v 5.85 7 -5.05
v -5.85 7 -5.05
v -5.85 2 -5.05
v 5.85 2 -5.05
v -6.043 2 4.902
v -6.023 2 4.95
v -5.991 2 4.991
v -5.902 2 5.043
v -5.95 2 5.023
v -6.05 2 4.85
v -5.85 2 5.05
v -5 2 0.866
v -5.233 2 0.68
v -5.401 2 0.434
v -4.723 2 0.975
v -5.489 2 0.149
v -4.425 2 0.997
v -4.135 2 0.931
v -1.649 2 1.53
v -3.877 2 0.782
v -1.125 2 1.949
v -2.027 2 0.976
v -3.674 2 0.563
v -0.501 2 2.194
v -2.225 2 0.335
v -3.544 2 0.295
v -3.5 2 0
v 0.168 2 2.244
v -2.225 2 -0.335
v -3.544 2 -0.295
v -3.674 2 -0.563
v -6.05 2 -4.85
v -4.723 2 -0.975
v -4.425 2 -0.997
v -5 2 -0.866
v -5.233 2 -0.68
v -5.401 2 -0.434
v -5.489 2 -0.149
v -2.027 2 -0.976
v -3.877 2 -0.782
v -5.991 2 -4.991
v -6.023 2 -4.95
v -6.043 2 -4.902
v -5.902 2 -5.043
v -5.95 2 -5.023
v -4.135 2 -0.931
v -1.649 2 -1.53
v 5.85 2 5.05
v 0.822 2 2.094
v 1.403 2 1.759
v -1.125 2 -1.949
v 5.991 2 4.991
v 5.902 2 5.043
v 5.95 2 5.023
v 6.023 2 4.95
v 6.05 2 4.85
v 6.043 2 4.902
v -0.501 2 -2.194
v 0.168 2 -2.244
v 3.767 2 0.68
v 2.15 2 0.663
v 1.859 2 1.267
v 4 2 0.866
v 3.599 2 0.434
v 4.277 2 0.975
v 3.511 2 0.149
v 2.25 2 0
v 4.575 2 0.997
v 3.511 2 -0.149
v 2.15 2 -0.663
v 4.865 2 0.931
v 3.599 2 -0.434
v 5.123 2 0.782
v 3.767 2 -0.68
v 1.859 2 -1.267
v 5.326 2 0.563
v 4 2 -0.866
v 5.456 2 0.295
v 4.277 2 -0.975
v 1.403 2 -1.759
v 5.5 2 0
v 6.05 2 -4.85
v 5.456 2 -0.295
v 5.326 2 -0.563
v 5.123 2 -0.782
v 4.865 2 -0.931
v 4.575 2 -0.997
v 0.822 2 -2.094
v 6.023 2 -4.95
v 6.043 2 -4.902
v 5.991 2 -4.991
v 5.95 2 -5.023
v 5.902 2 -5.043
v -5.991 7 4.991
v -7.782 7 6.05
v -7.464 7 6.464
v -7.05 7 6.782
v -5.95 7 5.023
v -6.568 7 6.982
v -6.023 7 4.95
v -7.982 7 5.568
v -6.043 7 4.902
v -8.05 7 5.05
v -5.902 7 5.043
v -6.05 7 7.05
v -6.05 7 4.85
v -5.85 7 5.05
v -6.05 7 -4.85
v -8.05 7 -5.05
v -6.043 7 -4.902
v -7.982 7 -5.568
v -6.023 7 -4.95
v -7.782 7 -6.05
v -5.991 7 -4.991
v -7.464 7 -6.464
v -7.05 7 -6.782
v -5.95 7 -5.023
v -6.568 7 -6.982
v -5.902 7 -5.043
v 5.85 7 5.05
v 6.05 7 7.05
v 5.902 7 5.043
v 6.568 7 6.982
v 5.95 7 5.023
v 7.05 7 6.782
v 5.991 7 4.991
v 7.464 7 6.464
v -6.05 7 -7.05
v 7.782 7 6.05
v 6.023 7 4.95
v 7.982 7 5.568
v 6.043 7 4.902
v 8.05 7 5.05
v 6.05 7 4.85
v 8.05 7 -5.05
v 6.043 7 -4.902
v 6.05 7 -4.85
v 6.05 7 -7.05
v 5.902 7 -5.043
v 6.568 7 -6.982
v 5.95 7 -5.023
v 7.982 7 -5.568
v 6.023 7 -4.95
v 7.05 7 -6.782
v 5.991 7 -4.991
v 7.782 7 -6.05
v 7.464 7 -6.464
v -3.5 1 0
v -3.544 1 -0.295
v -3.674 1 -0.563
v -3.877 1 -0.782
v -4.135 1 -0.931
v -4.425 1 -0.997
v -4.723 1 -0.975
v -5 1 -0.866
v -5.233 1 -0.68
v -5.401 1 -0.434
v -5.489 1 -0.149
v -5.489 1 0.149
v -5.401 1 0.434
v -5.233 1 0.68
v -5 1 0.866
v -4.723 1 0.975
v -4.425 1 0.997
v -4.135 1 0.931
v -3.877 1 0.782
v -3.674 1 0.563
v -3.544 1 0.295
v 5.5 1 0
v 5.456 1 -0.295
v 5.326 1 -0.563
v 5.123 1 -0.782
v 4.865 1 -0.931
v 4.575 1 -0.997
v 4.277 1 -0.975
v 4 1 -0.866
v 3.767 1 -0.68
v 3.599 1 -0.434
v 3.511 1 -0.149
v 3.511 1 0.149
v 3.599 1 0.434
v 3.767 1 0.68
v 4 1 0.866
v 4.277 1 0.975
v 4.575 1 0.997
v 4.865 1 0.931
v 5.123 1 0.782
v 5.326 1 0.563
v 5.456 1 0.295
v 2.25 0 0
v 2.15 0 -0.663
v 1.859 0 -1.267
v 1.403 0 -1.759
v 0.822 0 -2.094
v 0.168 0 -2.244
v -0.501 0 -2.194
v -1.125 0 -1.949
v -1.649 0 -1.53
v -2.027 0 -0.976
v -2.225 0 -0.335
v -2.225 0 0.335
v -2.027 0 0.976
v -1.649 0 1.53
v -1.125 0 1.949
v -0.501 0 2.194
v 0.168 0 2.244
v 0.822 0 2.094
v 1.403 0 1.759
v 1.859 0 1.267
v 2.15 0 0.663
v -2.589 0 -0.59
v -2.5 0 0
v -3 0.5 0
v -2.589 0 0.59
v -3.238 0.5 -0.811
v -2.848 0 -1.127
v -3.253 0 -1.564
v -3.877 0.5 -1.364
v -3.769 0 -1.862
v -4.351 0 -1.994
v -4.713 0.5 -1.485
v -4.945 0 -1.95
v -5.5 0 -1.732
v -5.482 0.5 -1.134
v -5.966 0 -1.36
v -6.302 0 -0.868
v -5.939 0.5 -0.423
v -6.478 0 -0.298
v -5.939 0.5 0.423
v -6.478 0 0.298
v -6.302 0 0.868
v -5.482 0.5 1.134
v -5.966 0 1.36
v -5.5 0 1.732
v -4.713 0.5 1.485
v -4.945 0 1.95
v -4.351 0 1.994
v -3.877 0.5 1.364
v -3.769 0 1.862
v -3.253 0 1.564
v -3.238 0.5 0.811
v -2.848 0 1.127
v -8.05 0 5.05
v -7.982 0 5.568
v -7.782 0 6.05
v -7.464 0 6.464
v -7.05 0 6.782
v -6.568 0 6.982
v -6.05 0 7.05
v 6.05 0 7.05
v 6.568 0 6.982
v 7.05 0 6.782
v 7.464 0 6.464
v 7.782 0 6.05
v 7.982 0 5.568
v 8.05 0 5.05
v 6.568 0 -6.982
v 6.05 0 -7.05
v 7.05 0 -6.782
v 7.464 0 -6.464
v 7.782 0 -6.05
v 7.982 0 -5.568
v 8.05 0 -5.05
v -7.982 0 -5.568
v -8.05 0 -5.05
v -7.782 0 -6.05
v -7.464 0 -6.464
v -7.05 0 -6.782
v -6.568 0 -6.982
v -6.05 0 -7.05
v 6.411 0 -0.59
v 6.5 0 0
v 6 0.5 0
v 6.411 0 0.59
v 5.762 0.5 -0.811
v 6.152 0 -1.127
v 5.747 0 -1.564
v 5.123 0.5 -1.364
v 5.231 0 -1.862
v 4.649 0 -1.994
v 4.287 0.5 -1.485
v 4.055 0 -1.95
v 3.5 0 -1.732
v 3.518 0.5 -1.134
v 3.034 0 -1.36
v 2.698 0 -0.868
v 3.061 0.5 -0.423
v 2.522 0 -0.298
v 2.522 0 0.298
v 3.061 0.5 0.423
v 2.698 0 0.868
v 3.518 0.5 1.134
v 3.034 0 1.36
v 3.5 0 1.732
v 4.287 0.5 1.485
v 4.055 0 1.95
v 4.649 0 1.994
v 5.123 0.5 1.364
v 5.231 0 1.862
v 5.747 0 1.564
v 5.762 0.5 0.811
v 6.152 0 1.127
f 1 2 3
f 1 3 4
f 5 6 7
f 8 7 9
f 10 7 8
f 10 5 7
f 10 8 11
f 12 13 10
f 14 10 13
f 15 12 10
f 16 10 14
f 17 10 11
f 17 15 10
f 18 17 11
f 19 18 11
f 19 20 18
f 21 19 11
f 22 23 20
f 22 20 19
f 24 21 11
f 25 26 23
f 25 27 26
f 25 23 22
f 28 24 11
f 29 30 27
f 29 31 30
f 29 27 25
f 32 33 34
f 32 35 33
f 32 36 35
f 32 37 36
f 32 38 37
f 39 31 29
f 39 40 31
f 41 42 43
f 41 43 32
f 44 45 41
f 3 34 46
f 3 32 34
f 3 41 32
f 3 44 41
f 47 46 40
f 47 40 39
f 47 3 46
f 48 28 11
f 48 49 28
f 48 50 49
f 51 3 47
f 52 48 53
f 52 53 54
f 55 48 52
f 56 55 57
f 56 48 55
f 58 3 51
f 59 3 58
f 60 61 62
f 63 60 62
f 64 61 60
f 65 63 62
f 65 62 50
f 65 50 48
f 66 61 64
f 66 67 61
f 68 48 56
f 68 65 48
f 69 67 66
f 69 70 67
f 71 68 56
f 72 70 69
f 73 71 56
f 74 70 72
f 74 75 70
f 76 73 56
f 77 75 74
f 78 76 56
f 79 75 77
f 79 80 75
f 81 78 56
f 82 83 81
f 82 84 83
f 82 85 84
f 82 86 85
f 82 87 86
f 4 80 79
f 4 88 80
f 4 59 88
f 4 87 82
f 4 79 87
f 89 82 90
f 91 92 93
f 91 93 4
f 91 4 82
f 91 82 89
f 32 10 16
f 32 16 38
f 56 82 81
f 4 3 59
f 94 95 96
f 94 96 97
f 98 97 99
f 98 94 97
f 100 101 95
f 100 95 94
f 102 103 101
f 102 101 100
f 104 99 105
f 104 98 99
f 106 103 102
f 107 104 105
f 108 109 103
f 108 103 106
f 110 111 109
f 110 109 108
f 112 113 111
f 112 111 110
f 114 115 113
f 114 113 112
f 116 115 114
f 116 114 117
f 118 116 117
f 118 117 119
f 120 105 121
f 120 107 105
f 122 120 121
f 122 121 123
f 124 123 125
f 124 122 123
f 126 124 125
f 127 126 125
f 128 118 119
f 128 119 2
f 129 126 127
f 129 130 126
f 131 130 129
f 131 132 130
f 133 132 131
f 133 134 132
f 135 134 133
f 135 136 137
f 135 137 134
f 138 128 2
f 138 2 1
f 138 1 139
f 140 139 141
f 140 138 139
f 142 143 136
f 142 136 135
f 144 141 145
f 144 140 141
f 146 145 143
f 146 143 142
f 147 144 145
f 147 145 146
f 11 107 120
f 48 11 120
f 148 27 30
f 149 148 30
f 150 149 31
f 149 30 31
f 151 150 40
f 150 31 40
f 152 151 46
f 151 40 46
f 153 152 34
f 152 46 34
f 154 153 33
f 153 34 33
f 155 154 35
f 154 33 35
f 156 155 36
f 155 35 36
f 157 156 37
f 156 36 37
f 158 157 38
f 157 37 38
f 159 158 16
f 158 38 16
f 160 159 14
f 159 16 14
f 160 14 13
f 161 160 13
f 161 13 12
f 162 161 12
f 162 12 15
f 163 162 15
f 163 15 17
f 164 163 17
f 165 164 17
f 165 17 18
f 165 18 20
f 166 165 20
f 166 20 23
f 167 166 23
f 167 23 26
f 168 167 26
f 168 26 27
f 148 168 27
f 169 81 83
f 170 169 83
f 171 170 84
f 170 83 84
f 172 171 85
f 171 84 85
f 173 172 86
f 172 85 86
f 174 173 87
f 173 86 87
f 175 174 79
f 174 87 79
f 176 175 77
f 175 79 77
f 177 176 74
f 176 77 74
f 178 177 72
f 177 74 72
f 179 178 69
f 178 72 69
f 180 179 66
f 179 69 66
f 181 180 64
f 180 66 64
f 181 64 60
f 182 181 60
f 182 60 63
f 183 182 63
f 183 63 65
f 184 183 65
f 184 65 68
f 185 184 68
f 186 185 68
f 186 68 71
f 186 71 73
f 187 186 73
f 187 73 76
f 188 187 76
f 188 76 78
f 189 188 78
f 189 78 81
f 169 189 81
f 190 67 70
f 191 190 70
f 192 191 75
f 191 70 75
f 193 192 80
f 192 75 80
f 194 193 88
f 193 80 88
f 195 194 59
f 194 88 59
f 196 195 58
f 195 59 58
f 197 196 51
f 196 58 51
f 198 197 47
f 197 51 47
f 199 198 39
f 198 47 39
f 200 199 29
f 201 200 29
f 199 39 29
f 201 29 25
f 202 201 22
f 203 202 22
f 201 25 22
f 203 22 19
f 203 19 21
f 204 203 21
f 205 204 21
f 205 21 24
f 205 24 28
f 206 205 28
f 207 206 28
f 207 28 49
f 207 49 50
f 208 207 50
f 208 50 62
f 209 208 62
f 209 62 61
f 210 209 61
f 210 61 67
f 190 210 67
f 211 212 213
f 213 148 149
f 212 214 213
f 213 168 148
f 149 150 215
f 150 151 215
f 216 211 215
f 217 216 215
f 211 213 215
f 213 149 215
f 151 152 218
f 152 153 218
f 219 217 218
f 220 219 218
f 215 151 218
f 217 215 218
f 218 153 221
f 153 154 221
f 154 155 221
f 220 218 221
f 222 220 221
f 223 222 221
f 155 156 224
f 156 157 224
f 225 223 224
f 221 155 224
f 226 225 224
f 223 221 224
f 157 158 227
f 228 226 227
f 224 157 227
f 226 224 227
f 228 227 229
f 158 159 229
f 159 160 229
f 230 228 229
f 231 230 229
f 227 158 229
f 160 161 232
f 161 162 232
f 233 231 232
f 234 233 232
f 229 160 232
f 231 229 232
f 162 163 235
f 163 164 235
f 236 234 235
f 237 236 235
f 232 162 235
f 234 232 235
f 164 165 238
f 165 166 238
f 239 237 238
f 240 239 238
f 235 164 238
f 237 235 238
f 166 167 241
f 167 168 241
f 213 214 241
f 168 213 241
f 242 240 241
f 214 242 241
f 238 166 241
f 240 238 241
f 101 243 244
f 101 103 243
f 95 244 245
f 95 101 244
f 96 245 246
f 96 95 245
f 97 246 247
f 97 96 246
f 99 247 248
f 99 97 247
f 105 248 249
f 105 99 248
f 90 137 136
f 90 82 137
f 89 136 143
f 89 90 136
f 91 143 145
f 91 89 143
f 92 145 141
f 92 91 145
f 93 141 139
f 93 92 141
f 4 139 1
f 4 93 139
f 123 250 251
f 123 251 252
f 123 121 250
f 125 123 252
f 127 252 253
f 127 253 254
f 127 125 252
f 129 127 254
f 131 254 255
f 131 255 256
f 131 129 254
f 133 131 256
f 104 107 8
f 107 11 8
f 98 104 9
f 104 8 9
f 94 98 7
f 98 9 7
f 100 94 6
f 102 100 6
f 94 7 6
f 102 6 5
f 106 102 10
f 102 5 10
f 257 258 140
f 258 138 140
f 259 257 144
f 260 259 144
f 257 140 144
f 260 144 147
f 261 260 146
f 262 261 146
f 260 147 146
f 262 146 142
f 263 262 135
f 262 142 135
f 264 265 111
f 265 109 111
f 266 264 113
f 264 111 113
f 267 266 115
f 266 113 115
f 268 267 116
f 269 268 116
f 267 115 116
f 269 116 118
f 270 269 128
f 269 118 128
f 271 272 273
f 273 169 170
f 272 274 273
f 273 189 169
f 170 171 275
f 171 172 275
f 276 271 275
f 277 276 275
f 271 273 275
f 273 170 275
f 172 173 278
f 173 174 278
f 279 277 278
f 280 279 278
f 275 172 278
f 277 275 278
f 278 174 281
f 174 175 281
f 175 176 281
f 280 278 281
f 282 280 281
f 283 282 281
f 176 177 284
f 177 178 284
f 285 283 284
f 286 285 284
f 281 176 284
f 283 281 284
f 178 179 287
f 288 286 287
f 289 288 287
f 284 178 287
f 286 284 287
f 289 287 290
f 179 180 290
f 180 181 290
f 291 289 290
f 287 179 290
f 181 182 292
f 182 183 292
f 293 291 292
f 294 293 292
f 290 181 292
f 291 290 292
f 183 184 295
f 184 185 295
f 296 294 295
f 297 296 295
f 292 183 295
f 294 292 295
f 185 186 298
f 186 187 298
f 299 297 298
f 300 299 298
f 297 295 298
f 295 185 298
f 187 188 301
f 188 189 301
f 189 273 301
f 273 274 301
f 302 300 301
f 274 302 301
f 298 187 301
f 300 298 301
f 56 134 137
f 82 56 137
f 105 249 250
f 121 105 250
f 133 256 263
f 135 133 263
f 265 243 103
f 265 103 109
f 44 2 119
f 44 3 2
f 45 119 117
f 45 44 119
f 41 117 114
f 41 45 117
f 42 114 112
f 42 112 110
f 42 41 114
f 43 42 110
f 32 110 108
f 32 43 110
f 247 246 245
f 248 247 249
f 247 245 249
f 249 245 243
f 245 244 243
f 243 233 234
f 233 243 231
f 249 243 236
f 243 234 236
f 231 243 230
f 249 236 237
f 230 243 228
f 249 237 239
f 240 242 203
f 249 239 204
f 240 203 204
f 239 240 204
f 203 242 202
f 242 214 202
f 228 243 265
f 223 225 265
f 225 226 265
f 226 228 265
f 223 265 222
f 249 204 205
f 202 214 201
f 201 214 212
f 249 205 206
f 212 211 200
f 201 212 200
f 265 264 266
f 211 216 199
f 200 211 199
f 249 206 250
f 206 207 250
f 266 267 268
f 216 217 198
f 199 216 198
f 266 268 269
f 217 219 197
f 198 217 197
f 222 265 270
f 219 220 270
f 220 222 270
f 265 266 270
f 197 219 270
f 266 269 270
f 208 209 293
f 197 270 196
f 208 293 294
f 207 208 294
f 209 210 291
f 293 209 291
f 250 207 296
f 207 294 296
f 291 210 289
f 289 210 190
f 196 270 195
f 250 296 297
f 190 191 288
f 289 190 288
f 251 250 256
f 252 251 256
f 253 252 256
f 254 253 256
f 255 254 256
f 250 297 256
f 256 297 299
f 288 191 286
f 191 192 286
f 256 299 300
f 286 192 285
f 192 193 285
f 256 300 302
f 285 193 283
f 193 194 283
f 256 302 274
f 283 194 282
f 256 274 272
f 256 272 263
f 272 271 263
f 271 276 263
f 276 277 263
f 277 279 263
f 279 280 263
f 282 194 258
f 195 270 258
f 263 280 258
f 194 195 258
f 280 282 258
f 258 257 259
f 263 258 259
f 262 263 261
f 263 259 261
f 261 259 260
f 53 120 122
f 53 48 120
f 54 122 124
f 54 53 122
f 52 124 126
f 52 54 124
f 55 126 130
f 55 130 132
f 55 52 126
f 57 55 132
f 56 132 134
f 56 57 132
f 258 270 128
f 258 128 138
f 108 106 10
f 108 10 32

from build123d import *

# Parameters (mm, degrees)
SKETCH1_W                                            = 16.1
SKETCH1_H                                            = 14.1
BOSS_EXTRUDE1_DEPTH                                  = 7
SKETCH3_W                                            = 12.1
SKETCH3_H                                            = 10.1
CUT_EXTRUDE1_DEPTH                                   = 5
CSK_FOR_M1_6_COUNTERSUNK_FLAT_HEAD_SCREW_D           = 2
CSK_FOR_M1_6_COUNTERSUNK_FLAT_HEAD_SCREW_DEPTH       = 2
CSK_FOR_M1_6_COUNTERSUNK_FLAT_HEAD_SCREW_CSINK_D     = 4
CSK_FOR_M1_6_COUNTERSUNK_FLAT_HEAD_SCREW_CSINK_ANGLE = 90
SKETCH8_R                                            = 2.25
CUT_EXTRUDE2_DEPTH                                   = 3
FILLET1_R                                            = 2
FILLET2_R                                            = 0.2


with BuildPart() as part:
    # Sketch1 → Boss-Extrude1 (new body)
    with BuildSketch(Plane(origin=(0, 0, 0), x_dir=(1, 0, 0), z_dir=(0, 1, 0))):
        Rectangle(SKETCH1_W, SKETCH1_H)
    extrude(amount=BOSS_EXTRUDE1_DEPTH)

    # Sketch3 → Cut-Extrude1 (cut)
    with BuildSketch(Plane(origin=(0, 7, 0), x_dir=(1, 0, 0), z_dir=(0, 1, 0))):
        Rectangle(SKETCH3_W, SKETCH3_H)
    extrude(amount=-CUT_EXTRUDE1_DEPTH, mode=Mode.SUBTRACT)

    # CSK for M1.6 Countersunk Flat Head Screw1
    with Locations(Plane(origin=(0, 0, 0), x_dir=(-1, 0, 0), z_dir=(0, -1, 0))):
        with Locations((4.5, 0), (-4.5, 0)):
            CounterSinkHole(CSK_FOR_M1_6_COUNTERSUNK_FLAT_HEAD_SCREW_D / 2, CSK_FOR_M1_6_COUNTERSUNK_FLAT_HEAD_SCREW_CSINK_D / 2, depth=CSK_FOR_M1_6_COUNTERSUNK_FLAT_HEAD_SCREW_DEPTH, counter_sink_angle=CSK_FOR_M1_6_COUNTERSUNK_FLAT_HEAD_SCREW_CSINK_ANGLE)

    # Sketch8 → Cut-Extrude2 (cut, through all)
    with BuildSketch(Plane(origin=(0, 2, 0), x_dir=(1, 0, 0), z_dir=(0, 1, 0))):
        Circle(SKETCH8_R)
    extrude(amount=-CUT_EXTRUDE2_DEPTH, mode=Mode.SUBTRACT)

    # Fillet1
    fillet1_edges = [part.edges().sort_by_distance(p)[0] for p in [
        (-8.05, 3.5, -7.05),
        (8.05, 3.5, -7.05),
        (8.05, 3.5, 7.05),
        (-8.05, 3.5, 7.05),
    ]]
    fillet(fillet1_edges, radius=FILLET1_R)

    # Fillet2
    fillet2_edges = [part.edges().sort_by_distance(p)[0] for p in [
        (-6.05, 4.5, 5.05),
        (-6.05, 4.5, -5.05),
        (6.05, 4.5, -5.05),
        (6.05, 4.5, 5.05),
    ]]
    fillet(fillet2_edges, radius=FILLET2_R)


solid = part.part
